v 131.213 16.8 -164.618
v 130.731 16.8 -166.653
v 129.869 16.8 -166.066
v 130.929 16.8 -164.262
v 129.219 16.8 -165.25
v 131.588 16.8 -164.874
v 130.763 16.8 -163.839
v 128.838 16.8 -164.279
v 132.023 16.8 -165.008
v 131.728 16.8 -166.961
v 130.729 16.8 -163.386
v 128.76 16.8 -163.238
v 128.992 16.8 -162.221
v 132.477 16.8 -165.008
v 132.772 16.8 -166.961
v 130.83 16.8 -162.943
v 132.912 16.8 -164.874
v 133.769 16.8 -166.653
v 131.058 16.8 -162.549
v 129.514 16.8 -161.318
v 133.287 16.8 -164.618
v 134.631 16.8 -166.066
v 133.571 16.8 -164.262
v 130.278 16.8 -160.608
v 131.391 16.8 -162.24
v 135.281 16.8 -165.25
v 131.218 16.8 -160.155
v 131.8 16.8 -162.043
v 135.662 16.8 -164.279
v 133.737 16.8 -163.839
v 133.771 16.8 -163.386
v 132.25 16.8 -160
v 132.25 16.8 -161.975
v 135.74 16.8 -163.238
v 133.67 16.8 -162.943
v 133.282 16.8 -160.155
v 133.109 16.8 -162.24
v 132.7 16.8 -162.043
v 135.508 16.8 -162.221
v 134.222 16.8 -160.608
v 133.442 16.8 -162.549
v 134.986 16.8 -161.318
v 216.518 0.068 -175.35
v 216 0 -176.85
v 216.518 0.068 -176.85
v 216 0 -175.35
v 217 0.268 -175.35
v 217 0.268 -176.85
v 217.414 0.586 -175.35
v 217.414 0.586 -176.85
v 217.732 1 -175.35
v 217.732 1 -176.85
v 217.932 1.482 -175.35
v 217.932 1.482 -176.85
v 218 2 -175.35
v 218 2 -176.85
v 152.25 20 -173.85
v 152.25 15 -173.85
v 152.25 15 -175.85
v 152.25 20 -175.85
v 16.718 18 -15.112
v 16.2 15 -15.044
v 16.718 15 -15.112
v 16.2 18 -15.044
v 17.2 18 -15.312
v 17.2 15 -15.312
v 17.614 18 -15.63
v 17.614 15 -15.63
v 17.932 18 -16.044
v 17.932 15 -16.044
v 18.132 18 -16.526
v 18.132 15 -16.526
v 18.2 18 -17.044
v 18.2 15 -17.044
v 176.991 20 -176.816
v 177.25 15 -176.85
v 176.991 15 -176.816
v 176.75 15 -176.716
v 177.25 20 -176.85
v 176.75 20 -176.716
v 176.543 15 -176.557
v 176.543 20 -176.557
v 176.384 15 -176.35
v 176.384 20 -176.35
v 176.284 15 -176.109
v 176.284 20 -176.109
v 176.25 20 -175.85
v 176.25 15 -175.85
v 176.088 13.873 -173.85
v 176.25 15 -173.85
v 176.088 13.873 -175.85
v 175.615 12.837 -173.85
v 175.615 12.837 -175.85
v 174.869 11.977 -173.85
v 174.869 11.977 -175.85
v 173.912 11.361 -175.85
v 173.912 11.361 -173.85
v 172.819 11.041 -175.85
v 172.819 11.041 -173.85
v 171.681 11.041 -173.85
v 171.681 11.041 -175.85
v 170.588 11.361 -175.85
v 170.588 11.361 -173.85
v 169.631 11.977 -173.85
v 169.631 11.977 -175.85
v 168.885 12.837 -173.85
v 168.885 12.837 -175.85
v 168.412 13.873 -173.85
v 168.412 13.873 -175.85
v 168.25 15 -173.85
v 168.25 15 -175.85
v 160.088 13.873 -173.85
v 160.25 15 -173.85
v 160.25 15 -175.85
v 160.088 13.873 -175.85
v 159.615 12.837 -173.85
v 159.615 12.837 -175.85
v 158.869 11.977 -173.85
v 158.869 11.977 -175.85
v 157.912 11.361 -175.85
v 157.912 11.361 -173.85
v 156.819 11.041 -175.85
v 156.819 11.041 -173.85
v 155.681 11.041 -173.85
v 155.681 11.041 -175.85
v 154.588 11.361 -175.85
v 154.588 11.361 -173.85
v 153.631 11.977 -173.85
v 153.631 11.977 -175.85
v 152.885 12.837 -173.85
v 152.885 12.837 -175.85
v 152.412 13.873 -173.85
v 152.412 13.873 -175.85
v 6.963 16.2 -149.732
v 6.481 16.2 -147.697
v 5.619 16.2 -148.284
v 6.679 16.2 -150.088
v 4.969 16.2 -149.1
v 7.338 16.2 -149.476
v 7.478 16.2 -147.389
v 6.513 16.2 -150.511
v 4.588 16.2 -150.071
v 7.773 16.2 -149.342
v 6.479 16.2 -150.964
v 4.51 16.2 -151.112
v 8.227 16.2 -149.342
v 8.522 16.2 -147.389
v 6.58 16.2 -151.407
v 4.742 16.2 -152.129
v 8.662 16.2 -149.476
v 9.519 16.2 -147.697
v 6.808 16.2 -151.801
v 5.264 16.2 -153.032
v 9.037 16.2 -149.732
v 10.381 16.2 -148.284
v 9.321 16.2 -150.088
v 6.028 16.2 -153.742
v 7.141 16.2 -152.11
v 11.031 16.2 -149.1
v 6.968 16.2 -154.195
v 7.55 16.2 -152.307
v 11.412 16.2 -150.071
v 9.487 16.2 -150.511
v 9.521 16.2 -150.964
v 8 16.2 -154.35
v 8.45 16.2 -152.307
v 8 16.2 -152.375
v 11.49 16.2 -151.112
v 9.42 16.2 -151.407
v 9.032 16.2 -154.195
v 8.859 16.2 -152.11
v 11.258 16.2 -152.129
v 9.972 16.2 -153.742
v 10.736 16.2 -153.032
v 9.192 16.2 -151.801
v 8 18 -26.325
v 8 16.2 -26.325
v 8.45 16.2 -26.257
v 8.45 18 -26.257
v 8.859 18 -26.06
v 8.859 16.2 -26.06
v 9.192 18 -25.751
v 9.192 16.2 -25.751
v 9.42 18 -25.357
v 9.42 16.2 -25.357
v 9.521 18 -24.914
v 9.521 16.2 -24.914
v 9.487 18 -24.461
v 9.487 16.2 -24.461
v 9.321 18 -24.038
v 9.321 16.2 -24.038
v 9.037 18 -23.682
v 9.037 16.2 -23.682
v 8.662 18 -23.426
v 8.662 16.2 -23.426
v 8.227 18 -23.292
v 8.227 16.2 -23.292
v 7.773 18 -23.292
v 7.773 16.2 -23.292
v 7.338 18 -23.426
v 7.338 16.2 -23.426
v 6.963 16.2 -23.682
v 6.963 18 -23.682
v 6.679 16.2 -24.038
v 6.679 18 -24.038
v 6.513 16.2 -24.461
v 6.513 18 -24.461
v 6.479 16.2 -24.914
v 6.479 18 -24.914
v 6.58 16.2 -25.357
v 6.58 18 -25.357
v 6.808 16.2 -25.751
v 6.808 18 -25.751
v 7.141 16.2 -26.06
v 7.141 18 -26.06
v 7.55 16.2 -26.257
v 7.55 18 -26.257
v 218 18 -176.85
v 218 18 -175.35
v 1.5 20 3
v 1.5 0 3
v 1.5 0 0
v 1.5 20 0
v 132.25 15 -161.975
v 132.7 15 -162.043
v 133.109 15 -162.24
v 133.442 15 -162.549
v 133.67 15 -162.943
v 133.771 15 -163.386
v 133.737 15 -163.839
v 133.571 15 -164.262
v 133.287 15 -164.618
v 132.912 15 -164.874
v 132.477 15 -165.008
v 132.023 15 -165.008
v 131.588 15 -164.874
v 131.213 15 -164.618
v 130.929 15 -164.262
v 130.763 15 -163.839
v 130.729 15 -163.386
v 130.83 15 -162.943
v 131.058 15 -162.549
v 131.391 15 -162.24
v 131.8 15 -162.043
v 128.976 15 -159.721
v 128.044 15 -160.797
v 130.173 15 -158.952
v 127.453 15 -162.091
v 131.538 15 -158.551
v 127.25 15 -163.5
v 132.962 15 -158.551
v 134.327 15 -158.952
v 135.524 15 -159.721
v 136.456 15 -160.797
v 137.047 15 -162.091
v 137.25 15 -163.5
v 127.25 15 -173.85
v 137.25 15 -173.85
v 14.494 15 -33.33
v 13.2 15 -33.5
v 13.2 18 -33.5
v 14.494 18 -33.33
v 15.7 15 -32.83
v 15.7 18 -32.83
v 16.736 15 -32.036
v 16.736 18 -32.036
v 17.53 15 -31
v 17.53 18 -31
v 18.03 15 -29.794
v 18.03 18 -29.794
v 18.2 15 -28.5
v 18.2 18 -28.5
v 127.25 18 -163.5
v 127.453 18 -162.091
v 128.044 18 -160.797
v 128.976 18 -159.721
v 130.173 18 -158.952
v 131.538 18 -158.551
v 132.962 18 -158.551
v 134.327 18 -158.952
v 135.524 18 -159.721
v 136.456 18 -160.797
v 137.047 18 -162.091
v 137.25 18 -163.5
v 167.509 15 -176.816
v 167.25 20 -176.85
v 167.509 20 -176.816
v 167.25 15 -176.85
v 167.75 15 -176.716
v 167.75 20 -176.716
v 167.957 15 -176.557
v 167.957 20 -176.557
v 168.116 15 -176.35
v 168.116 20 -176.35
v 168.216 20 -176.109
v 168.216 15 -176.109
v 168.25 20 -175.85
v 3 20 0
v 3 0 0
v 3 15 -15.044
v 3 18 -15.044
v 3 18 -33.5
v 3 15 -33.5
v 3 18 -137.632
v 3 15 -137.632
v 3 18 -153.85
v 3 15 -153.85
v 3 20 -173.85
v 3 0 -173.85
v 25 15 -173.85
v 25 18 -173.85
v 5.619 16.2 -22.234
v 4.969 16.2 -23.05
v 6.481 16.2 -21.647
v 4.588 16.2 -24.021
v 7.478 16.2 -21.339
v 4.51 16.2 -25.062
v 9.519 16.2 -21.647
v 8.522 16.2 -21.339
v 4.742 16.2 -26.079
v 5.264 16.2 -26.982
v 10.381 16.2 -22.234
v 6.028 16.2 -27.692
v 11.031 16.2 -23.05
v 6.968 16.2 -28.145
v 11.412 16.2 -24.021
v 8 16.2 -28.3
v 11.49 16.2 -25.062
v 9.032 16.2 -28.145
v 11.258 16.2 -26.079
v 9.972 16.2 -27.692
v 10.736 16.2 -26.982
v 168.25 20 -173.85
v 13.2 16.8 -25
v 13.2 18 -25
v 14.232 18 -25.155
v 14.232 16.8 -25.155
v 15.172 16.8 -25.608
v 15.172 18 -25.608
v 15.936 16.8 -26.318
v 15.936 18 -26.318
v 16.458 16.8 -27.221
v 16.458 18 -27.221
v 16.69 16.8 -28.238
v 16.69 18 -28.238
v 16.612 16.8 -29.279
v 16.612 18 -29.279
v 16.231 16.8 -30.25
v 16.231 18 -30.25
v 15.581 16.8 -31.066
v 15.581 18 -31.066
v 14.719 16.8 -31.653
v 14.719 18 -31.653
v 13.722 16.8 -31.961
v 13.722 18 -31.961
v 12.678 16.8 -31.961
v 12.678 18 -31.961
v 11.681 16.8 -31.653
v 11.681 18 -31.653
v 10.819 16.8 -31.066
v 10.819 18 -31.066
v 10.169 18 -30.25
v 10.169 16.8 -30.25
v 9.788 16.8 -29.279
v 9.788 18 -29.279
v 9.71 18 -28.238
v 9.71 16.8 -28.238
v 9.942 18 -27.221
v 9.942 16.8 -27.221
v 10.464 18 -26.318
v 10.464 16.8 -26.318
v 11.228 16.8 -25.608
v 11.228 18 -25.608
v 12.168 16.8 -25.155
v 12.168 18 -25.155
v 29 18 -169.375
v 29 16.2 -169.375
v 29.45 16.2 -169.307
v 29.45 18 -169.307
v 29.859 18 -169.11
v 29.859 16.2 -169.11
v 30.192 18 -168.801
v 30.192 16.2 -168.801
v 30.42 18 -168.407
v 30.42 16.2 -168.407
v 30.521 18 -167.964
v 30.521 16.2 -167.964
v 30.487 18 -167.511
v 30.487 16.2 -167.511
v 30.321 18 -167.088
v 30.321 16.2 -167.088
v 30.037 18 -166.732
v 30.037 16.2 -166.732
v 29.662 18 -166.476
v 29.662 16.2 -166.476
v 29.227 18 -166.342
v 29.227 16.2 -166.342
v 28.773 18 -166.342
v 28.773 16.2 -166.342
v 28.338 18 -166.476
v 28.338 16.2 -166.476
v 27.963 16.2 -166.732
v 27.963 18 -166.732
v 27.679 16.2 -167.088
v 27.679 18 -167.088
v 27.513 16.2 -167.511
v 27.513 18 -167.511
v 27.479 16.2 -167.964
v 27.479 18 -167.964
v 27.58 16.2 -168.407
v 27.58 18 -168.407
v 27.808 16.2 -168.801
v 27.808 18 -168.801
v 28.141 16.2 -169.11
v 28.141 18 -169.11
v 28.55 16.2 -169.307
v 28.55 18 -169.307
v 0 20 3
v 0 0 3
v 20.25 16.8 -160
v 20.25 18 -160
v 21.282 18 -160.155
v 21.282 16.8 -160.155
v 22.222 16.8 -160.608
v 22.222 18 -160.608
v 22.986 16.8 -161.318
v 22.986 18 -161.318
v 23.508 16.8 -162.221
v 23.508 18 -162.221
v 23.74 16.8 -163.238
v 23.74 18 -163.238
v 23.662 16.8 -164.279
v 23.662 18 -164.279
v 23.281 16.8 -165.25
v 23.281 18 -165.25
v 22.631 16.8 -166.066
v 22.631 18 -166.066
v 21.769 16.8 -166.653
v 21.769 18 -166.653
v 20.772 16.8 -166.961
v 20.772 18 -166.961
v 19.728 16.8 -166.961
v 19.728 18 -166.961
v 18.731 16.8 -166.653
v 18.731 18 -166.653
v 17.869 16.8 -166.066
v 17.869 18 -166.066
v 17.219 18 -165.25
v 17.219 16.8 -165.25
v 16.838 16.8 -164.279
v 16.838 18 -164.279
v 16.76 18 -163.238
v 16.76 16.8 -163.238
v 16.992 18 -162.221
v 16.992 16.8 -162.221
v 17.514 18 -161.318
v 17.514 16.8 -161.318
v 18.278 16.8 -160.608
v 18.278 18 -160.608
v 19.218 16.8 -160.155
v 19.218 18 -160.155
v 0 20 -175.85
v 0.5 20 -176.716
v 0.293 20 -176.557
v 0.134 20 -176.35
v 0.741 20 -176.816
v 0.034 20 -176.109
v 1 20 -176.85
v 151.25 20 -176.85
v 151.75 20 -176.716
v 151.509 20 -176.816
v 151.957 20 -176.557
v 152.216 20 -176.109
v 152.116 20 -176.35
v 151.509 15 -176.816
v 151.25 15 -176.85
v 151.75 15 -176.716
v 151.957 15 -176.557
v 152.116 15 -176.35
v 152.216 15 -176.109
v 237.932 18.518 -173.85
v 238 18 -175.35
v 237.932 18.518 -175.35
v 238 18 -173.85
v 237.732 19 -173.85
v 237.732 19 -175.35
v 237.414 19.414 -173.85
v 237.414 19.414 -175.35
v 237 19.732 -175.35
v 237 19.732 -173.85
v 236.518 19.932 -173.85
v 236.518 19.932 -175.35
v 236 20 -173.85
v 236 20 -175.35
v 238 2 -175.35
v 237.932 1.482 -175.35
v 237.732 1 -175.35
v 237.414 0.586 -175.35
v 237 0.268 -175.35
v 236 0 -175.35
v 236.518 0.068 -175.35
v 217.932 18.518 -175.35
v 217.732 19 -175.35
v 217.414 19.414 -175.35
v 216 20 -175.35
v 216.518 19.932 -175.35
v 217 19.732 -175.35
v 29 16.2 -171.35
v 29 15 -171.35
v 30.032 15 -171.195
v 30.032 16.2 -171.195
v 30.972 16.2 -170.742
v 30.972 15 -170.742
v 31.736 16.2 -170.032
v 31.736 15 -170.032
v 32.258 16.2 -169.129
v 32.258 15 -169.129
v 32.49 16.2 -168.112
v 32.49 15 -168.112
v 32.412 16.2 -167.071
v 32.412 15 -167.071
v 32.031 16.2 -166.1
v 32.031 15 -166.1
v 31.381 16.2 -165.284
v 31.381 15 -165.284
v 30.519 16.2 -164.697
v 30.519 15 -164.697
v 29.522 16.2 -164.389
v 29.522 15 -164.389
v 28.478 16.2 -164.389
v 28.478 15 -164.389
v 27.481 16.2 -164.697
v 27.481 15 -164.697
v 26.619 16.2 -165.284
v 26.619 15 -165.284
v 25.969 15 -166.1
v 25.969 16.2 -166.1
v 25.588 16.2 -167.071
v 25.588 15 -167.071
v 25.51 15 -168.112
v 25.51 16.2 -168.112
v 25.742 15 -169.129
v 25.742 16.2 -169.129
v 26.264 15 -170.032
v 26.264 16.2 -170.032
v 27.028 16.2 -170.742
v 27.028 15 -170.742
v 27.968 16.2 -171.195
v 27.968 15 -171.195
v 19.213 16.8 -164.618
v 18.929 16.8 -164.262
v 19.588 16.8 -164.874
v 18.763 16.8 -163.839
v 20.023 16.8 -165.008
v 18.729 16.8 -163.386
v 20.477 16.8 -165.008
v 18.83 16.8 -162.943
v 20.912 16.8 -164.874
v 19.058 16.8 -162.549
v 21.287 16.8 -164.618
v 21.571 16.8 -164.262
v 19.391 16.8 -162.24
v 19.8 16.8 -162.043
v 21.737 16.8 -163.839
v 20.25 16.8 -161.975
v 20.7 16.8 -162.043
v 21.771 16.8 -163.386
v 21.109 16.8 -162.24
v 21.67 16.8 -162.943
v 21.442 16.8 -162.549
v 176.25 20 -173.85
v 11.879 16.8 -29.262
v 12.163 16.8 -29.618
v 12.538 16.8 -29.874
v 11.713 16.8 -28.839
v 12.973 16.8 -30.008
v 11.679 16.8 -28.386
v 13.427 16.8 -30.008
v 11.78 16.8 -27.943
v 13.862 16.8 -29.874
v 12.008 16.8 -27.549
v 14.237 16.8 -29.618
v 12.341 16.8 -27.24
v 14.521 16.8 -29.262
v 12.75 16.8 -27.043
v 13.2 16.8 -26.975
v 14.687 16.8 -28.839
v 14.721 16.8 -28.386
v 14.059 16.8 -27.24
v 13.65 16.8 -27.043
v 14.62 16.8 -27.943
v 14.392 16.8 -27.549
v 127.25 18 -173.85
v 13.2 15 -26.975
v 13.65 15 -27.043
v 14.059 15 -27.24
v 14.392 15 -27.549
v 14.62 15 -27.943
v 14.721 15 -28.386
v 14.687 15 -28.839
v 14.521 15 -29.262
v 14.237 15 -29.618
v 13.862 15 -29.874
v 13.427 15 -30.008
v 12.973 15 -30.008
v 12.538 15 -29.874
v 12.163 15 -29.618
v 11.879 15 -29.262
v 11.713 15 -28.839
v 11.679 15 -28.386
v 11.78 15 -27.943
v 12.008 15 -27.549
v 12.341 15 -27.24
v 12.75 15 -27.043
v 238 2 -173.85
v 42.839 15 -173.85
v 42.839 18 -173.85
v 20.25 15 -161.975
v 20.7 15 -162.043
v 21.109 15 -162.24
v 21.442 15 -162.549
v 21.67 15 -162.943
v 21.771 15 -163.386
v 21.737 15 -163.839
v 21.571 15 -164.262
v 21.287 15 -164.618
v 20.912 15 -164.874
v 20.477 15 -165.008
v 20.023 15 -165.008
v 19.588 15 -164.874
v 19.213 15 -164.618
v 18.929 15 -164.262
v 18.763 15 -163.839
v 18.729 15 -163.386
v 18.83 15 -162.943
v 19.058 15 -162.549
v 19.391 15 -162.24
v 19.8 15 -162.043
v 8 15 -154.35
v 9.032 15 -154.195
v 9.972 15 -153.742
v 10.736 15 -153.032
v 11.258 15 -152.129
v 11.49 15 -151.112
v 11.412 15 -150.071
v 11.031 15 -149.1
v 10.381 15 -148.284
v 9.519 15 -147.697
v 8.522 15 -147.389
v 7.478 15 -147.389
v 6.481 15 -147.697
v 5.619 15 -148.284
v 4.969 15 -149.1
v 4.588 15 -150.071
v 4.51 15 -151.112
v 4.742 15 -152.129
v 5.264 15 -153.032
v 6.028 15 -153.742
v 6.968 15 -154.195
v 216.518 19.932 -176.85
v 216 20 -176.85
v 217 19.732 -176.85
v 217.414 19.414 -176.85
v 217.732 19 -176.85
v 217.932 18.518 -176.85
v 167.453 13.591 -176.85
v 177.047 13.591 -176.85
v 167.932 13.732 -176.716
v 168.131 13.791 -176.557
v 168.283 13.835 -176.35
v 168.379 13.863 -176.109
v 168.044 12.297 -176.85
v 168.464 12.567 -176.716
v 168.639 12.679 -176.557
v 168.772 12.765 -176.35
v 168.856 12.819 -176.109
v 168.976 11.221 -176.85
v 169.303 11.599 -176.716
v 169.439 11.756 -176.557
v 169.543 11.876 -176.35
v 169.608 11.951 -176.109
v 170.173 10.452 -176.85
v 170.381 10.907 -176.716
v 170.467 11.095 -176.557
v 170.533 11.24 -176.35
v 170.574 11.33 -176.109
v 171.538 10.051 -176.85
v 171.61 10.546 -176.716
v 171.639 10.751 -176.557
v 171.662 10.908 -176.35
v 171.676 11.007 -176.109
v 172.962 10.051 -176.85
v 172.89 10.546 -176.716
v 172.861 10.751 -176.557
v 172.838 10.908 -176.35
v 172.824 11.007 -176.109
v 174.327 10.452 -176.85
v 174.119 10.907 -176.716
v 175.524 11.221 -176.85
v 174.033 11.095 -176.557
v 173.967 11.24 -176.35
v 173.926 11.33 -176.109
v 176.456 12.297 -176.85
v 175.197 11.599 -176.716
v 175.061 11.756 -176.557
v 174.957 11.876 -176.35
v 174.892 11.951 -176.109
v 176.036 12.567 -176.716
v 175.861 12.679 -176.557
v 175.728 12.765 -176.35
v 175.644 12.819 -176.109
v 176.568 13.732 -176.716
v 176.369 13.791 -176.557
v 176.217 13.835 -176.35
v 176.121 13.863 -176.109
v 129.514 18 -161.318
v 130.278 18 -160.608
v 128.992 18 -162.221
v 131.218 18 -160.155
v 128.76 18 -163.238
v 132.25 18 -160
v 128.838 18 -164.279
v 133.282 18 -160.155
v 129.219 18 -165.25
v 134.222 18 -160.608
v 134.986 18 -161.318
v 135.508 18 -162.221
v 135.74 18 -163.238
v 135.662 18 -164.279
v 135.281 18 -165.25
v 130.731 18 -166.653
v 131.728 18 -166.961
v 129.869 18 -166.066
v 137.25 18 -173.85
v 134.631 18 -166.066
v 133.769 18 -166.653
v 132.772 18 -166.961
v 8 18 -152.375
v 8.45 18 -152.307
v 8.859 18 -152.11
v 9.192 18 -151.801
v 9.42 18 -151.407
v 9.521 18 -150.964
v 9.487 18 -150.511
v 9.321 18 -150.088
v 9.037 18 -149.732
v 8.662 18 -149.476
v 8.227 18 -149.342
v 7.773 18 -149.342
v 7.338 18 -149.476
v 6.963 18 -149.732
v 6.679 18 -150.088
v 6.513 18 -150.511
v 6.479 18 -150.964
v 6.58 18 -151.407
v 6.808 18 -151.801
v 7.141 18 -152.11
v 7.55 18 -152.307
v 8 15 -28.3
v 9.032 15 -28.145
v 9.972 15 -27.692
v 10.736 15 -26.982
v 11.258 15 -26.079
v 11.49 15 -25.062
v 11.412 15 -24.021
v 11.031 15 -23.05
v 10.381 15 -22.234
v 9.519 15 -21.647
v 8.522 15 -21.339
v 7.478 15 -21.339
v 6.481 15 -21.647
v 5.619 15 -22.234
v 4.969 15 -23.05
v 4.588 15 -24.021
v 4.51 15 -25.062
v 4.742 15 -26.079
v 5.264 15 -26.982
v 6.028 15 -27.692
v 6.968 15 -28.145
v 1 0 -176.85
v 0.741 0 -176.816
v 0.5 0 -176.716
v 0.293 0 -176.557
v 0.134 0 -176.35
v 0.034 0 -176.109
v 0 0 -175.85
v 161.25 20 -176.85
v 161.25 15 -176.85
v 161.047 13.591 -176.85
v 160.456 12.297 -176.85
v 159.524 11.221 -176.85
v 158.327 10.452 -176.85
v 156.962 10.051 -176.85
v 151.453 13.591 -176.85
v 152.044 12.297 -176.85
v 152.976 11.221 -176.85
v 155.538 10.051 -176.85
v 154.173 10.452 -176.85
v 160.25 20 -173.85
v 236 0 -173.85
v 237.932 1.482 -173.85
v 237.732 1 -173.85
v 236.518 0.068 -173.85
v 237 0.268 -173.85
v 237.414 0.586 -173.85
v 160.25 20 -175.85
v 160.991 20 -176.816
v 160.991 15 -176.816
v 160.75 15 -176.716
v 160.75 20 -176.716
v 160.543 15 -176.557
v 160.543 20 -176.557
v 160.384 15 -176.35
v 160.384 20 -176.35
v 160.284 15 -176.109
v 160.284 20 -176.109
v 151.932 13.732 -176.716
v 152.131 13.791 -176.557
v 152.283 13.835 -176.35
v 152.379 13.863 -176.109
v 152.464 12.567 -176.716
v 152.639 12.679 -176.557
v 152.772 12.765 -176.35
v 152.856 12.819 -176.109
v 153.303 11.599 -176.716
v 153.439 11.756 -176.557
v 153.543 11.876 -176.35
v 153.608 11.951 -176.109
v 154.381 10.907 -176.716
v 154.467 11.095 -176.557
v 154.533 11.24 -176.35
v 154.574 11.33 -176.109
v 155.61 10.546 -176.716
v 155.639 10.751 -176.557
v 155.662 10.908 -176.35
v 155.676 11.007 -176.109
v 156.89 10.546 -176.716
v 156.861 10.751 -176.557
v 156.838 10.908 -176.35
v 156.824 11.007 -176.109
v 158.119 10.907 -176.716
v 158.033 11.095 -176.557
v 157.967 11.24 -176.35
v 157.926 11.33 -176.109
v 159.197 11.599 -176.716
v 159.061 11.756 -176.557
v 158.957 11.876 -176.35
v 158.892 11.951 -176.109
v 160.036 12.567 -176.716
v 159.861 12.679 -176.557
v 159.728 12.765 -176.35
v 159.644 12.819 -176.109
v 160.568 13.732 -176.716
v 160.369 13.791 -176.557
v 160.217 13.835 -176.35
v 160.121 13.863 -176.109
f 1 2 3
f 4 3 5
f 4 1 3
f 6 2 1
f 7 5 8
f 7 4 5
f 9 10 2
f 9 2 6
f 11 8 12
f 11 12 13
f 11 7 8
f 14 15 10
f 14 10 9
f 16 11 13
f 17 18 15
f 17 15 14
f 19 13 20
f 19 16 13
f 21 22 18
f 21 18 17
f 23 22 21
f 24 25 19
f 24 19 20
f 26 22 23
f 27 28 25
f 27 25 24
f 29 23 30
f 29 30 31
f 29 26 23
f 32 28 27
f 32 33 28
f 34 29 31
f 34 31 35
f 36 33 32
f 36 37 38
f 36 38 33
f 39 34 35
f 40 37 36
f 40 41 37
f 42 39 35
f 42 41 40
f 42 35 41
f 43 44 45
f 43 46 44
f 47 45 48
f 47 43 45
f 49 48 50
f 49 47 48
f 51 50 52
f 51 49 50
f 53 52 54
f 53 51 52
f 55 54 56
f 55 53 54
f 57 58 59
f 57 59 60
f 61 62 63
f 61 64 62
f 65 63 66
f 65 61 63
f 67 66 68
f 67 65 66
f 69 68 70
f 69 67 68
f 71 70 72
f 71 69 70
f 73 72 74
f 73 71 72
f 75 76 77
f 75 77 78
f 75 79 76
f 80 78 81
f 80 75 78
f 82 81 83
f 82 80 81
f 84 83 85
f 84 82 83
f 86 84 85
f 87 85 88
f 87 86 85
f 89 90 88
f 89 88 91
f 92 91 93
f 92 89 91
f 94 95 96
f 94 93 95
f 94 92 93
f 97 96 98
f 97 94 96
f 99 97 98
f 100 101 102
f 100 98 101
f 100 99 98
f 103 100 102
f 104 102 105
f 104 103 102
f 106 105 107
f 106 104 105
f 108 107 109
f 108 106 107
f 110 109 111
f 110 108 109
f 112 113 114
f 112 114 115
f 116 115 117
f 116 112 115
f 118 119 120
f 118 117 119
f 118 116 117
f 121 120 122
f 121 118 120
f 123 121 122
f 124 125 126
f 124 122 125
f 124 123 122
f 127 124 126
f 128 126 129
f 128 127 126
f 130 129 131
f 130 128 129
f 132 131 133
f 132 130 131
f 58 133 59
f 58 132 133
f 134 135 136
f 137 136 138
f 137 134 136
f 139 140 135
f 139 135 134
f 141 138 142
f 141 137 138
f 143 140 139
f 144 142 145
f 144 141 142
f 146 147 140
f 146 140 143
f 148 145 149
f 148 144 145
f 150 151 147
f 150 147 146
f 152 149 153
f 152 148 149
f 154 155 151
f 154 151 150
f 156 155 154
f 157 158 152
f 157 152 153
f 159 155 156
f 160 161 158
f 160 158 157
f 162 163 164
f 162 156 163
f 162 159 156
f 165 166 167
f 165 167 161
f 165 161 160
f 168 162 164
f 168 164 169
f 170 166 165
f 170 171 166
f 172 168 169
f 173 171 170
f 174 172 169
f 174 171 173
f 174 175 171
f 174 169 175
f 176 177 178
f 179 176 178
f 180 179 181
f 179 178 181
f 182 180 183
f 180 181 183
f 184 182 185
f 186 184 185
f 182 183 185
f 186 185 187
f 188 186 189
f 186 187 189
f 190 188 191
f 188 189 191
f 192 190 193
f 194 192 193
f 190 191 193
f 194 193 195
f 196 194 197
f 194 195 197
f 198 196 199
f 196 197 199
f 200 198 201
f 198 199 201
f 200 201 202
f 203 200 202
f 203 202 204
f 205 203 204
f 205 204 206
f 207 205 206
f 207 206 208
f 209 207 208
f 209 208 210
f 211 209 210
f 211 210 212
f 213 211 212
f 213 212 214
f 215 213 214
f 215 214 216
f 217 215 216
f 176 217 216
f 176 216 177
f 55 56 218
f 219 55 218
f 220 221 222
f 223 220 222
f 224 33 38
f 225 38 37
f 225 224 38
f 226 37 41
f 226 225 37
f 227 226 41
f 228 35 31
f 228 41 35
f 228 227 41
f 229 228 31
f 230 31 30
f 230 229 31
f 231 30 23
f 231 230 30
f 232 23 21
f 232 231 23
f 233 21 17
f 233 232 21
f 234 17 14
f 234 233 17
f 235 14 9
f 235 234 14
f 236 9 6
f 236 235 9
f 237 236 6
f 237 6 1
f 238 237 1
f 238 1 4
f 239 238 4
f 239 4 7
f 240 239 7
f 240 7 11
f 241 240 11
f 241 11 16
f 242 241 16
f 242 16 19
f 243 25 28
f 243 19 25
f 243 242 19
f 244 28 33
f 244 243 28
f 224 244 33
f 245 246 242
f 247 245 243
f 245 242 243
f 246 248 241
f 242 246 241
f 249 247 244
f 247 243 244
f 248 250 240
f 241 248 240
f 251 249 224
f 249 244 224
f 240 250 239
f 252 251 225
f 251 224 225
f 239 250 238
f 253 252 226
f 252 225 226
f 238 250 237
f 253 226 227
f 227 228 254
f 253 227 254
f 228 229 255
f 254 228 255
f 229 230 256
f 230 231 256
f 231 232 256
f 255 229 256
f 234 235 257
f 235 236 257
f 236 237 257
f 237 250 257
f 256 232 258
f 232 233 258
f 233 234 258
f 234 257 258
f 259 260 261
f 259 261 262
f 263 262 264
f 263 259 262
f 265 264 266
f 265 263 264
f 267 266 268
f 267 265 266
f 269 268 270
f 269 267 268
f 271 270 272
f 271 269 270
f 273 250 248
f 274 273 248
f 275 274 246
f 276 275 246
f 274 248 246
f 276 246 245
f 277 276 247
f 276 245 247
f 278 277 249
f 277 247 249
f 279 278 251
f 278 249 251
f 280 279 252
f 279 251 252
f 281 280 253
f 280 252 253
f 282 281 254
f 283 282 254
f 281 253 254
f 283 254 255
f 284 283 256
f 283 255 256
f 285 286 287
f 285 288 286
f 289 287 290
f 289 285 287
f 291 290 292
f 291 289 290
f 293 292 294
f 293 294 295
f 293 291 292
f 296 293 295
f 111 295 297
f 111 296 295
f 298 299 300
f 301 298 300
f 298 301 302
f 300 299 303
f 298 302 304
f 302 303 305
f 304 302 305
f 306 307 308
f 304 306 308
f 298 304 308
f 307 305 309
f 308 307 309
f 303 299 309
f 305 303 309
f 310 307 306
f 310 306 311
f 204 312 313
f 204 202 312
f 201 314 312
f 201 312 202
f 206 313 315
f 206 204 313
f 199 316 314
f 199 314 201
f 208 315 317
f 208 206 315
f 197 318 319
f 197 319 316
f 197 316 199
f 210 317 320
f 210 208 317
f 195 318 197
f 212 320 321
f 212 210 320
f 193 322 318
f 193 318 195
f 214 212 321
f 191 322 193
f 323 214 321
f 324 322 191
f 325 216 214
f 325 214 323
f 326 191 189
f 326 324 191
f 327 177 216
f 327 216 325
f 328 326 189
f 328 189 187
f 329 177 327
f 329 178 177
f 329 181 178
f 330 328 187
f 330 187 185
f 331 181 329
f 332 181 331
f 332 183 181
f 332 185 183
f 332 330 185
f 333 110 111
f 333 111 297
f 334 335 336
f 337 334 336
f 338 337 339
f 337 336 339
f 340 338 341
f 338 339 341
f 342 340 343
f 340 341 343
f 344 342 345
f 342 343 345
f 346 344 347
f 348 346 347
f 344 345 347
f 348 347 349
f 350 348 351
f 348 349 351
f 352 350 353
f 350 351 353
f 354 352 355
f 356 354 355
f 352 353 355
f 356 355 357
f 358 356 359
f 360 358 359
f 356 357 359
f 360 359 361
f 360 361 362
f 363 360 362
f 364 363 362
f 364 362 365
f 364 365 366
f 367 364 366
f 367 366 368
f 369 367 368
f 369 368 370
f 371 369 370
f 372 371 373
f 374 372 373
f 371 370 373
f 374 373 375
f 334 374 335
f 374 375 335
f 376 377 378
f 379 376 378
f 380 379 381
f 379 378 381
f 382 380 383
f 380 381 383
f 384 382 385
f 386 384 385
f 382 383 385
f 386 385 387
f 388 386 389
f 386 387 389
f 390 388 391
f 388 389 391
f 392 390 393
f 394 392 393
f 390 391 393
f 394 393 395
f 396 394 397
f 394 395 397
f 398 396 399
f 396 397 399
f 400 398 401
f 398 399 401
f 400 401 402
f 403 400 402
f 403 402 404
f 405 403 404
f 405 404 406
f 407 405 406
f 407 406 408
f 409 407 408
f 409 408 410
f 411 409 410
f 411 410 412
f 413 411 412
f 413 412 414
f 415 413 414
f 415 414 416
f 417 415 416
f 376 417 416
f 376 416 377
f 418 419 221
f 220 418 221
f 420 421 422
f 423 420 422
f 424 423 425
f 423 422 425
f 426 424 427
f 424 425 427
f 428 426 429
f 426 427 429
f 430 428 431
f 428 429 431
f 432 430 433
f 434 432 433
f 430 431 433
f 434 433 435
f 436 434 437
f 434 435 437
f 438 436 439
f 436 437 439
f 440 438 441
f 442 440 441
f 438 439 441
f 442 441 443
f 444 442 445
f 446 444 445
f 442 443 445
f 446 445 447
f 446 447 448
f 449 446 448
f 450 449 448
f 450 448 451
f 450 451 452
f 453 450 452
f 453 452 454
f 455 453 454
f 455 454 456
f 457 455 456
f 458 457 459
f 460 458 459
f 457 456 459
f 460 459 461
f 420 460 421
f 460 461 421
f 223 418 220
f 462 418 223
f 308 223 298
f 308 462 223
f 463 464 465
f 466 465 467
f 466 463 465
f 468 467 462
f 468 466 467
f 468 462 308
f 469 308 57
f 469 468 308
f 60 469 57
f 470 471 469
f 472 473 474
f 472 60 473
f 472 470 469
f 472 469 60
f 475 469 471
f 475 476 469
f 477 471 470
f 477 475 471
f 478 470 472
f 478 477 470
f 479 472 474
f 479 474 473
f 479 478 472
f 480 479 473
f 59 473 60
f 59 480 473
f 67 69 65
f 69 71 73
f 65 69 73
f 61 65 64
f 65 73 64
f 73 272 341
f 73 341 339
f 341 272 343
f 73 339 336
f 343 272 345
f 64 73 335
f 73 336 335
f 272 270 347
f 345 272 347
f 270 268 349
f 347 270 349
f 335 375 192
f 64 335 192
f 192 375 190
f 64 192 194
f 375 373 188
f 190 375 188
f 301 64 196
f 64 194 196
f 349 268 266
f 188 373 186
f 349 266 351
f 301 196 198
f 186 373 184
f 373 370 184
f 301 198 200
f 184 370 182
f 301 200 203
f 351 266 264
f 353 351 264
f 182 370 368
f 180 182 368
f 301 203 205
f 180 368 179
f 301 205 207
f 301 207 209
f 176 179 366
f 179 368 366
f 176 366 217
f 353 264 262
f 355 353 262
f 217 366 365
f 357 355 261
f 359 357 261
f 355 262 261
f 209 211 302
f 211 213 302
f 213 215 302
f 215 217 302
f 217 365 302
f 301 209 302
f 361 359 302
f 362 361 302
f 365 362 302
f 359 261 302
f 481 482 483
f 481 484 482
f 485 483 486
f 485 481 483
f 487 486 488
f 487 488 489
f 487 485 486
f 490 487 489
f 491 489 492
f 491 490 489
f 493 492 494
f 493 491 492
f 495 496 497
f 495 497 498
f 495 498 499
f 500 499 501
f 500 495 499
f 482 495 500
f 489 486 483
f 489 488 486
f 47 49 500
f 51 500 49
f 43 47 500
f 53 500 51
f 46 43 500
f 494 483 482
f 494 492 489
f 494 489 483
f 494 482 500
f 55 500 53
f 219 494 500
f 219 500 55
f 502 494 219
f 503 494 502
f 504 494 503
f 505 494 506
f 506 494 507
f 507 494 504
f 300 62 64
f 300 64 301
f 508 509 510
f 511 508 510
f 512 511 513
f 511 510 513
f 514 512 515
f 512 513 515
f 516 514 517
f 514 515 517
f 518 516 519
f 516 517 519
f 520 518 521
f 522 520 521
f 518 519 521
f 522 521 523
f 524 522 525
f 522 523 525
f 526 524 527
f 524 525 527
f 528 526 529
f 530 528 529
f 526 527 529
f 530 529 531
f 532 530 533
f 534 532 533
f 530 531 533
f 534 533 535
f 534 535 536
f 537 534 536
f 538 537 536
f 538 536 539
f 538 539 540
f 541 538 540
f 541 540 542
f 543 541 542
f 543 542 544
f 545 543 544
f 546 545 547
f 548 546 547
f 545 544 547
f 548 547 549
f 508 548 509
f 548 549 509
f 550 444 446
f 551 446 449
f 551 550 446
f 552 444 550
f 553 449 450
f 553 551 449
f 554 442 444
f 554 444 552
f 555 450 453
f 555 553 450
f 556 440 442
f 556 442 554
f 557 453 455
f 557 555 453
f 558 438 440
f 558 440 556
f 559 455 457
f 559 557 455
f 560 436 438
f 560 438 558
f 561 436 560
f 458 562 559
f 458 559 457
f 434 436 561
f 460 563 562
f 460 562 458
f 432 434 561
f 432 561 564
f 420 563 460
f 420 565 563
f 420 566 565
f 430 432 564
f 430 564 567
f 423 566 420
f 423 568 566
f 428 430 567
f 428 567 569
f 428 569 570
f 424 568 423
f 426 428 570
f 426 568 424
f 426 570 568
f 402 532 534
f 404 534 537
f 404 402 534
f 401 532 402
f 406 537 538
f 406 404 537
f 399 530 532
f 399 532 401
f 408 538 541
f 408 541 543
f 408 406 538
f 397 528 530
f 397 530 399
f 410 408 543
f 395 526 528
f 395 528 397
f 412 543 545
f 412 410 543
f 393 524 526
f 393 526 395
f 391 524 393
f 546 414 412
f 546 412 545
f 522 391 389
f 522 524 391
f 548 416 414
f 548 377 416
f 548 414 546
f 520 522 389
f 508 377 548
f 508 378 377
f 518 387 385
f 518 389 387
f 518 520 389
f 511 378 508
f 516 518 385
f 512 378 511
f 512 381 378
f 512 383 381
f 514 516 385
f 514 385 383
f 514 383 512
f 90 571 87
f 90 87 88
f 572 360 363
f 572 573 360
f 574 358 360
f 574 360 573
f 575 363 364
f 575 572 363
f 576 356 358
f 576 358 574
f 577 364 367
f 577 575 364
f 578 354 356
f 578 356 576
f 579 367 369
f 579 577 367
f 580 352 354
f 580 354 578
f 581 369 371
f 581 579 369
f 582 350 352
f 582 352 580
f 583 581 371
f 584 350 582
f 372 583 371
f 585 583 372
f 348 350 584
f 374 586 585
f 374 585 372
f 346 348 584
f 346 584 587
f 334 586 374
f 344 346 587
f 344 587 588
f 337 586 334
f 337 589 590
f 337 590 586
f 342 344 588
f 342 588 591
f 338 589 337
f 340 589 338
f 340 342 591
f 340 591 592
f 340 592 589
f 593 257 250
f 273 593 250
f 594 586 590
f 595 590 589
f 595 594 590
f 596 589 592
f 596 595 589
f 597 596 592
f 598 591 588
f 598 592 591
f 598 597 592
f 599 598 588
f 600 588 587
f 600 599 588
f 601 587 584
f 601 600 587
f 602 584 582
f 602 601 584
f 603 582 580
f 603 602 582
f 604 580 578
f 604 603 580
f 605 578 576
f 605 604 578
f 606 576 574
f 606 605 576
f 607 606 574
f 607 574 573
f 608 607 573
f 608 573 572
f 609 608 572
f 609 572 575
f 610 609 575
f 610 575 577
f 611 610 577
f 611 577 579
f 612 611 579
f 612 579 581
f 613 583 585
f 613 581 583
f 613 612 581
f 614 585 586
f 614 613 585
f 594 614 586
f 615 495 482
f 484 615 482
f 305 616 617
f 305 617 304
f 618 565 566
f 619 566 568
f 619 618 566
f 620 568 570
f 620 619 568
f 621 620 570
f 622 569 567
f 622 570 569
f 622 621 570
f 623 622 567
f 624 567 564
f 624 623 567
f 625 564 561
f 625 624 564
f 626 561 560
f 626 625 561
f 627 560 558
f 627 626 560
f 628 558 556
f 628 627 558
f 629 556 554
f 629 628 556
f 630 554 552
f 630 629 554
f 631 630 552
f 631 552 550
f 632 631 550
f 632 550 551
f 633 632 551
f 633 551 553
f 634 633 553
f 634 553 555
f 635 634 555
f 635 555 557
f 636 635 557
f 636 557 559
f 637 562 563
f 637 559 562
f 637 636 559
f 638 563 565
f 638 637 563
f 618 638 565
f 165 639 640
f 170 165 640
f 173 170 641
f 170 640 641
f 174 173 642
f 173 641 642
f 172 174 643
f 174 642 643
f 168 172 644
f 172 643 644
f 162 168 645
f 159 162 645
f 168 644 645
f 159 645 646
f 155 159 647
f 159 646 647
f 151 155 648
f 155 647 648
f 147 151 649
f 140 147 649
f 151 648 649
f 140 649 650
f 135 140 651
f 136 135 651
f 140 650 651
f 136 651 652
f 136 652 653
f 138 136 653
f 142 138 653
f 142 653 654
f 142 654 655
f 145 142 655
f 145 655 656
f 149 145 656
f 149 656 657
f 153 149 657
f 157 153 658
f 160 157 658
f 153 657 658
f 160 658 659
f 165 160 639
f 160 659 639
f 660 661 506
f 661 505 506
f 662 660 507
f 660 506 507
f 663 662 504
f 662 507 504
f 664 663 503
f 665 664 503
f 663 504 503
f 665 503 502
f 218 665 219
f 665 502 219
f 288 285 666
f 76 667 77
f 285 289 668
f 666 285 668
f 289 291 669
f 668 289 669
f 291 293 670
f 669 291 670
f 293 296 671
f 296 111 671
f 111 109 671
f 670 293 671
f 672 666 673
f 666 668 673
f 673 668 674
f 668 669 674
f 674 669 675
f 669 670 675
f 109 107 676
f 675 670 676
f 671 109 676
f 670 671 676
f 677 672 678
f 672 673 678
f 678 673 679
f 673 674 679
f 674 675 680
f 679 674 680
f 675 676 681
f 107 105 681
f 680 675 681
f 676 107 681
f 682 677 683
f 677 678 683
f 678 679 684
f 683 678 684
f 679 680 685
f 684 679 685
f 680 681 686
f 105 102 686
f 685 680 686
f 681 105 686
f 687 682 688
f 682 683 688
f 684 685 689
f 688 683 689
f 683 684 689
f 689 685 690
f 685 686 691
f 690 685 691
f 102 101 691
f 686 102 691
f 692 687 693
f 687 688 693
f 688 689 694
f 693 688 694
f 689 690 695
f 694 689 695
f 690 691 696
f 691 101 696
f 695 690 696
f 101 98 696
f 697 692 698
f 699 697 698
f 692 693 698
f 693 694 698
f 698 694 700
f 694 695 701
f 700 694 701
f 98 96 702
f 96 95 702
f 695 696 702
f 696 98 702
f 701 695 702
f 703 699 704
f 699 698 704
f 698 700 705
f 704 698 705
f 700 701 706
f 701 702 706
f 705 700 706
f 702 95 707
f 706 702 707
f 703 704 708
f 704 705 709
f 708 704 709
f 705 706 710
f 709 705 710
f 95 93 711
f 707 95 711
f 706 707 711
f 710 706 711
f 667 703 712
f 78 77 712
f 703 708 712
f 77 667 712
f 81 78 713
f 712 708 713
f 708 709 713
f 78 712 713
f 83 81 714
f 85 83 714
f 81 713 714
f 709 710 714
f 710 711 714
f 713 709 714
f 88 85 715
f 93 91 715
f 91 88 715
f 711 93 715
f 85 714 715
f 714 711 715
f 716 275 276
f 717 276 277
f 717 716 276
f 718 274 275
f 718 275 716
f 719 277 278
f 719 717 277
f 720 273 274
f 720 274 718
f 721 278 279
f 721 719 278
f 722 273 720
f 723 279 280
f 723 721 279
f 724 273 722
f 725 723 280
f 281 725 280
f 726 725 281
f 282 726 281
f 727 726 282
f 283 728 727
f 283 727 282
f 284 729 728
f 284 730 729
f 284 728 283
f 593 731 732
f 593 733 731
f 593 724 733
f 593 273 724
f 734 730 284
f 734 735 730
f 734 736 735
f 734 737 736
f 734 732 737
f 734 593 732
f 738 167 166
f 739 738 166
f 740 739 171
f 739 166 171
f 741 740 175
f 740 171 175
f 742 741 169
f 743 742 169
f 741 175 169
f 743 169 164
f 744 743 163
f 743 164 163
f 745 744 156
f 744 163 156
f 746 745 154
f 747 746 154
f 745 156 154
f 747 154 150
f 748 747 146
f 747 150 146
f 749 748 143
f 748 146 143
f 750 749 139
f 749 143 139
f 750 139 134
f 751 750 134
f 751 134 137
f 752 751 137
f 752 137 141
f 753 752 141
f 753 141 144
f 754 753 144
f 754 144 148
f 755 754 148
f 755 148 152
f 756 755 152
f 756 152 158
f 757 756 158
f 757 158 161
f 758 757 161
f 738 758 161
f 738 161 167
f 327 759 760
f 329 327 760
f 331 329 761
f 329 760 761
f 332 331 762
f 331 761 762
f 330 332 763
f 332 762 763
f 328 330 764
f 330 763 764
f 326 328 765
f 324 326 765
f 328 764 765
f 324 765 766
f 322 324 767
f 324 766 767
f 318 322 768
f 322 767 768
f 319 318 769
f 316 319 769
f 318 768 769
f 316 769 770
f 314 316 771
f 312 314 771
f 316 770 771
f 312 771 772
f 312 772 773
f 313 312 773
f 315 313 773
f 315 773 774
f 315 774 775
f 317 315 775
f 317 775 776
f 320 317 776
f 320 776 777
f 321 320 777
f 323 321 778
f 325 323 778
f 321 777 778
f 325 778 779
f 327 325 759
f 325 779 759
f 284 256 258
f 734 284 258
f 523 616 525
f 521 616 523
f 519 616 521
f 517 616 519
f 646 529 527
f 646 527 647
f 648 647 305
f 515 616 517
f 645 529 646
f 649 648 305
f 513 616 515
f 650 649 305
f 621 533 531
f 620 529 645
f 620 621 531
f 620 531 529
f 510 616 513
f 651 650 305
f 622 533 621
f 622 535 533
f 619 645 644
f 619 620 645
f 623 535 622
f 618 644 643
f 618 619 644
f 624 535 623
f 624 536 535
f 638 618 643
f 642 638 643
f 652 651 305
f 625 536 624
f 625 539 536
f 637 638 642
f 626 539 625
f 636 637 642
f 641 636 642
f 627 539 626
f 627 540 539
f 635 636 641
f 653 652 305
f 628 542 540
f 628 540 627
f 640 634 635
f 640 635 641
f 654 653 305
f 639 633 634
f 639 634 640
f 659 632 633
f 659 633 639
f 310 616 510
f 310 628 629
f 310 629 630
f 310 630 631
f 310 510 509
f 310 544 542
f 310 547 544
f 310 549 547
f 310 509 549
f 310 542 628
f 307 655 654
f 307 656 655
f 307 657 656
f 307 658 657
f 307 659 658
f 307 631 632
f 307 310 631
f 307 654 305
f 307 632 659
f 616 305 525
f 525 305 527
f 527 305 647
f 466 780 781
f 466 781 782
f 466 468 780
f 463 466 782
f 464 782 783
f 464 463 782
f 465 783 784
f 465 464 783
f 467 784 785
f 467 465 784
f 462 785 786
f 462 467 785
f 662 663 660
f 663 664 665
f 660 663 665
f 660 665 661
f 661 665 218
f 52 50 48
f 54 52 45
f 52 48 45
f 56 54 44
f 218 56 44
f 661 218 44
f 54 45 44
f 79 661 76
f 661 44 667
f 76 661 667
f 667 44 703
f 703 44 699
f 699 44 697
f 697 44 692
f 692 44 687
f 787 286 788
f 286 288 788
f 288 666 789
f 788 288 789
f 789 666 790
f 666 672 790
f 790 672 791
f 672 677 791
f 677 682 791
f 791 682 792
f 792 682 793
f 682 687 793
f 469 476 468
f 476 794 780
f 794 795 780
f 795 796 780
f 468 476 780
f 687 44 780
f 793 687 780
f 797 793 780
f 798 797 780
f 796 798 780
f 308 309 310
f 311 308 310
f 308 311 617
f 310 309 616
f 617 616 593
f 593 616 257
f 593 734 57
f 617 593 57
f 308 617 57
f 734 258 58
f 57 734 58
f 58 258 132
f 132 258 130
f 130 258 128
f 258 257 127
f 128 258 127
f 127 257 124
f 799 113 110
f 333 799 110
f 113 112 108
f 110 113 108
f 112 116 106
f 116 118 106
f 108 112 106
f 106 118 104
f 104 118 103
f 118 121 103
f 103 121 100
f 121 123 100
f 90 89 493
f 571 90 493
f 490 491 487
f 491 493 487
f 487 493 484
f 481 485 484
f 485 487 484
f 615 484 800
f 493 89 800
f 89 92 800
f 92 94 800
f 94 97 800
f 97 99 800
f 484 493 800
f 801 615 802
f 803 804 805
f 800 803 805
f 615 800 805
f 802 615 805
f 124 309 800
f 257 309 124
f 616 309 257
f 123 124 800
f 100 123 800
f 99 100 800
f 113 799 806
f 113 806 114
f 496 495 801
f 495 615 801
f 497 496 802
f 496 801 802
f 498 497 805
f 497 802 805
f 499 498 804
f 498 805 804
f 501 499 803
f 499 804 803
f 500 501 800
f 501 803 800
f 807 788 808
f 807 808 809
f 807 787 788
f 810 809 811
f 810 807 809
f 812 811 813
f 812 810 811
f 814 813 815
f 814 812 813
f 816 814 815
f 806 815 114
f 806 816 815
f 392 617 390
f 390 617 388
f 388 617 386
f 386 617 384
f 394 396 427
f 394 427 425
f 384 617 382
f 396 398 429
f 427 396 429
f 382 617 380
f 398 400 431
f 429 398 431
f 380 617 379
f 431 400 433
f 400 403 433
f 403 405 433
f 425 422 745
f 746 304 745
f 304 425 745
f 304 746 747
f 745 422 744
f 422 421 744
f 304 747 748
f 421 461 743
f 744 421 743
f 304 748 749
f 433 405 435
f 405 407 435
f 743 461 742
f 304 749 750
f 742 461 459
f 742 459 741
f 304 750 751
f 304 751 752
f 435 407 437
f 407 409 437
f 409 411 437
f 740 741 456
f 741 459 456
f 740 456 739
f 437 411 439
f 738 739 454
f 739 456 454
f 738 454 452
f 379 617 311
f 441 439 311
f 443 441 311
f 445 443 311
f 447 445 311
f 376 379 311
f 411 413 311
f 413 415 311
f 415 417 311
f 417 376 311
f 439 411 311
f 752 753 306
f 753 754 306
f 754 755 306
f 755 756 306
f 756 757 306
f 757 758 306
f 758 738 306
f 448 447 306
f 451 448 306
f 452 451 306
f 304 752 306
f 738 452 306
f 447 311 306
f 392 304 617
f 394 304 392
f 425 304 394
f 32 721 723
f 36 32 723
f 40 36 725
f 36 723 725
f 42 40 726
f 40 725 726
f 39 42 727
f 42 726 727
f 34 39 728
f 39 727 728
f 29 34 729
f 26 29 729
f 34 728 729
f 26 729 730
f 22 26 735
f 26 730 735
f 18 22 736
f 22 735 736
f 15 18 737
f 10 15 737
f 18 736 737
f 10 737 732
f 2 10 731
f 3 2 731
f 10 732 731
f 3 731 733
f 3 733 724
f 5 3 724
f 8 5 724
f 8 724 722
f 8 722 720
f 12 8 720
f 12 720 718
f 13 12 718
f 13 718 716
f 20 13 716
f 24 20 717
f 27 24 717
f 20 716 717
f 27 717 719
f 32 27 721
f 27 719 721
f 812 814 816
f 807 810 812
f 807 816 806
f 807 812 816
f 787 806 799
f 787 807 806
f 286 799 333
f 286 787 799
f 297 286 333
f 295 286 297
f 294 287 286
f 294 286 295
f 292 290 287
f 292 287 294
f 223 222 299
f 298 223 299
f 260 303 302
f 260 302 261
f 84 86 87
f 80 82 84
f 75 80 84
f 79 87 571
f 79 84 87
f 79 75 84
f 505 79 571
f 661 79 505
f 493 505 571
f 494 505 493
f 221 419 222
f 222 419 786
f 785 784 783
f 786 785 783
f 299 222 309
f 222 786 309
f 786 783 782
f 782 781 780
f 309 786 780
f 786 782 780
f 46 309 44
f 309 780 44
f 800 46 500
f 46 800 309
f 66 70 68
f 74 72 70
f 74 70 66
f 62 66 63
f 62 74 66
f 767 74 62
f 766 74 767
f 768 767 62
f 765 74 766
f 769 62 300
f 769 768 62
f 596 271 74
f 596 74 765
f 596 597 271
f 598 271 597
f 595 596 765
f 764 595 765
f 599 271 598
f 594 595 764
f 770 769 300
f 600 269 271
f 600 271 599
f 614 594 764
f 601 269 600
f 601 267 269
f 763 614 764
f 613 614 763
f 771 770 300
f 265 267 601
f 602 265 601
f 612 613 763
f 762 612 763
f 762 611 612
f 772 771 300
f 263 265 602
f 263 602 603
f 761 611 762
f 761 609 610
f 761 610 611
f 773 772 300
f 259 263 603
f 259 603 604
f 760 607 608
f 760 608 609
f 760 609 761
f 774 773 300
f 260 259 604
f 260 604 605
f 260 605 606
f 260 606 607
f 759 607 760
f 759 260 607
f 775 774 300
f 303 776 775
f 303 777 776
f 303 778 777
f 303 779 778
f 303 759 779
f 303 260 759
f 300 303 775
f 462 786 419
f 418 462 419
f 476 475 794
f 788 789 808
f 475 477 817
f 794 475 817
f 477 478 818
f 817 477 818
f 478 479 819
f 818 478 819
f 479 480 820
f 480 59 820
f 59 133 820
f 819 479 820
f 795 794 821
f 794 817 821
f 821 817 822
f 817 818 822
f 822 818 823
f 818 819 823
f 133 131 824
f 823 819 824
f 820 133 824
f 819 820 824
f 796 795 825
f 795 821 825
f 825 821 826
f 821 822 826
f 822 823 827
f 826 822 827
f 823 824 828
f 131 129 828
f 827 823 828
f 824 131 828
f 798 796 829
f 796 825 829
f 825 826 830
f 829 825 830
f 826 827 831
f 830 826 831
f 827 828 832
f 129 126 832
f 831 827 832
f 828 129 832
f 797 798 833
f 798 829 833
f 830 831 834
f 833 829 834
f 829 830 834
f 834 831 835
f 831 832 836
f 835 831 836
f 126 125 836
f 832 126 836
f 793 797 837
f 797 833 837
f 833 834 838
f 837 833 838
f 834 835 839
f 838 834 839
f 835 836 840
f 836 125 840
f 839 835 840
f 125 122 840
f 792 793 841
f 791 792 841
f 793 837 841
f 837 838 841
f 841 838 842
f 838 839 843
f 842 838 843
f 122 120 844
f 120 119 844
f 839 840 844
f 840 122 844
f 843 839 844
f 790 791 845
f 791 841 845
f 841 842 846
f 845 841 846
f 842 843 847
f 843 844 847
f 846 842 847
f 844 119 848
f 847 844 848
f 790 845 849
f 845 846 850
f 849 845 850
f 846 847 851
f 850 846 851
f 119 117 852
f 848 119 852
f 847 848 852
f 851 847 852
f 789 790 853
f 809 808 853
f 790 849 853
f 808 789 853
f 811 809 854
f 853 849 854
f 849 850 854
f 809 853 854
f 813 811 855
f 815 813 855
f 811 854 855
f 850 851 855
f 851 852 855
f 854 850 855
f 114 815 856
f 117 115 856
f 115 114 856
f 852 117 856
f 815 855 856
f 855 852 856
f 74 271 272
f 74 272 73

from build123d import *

# Parameters (mm, degrees)
EXTRUDE_1_DEPTH     = 20
EXTRUDE_START       = 1
SKETCH_2_R          = 1.525
EXTRUDE_2_DEPTH     = 3
CUT_EXTRUDE_1_REACH = 358.708
SKETCH_3_W          = 31
SKETCH_3_H          = 9.5
SKETCH_4_R          = 3.5
CUT_EXTRUDE_2_DEPTH = 1.2
CUT_EXTRUDE_3_REACH = 356.959
SKETCH_5_R          = 1.525
FILLET_1_R          = 1
FILLET_3_R          = 1
SKETCH_6_R          = 3.5
CUT_EXTRUDE_4_DEPTH = 1.2
SKETCH_7_W          = 69.4
SKETCH_7_H          = 20
CUT_EXTRUDE_5_DEPTH = 3
SKETCH_8_W          = 20
SKETCH_8_H          = 20
CUT_EXTRUDE_6_DEPTH = 1.5
FILLET_4_R          = 2
FILLET_5_R          = 2
FILLET_6_R          = 2
CUT_EXTRUDE_7_DEPTH = 10
FILLET_7_R          = 1
FILLET_8_R          = 1


with BuildPart() as part:
    # 草图1 → 凸台-拉伸1 (new body)
    with BuildSketch(Plane(origin=(0, 0, 0), x_dir=(1, 0, 0), z_dir=(0, 1, 0))):
        Polygon((1.5, 0), (3, 0), (3, 173.85), (307.4, 173.85), (307.4, 176.85), (0, 176.85), (0, 0), (0, -3), (1.5, -3), align=None)
    extrude(amount=EXTRUDE_1_DEPTH)

    # 草图2 → 凸台-拉伸2 (add)
    # profile 1 of 3: a face of its own
    with BuildSketch(Plane(origin=(0, 14, 0), x_dir=(1, 0, 0), z_dir=(0, 1, 0)).offset(EXTRUDE_START)):
        Polygon((3, 153.85), (25, 173.85), (42.839282497, 173.85), (3, 137.632470457), align=None)
        with Locations(Location((20.25, 163.5, 0), (0, 0, 270))):
            Circle(SKETCH_2_R, mode=Mode.SUBTRACT)
    # profile 2 of 3: a face of its own
    with BuildSketch(Plane(origin=(0, 14, 0), x_dir=(1, 0, 0), z_dir=(0, 1, 0)).offset(EXTRUDE_START)):
        with BuildLine():
            Line((137.25, 163.5), (137.25, 173.85))
            Line((137.25, 173.85), (127.25, 173.85))
            Line((127.25, 173.85), (127.25, 163.5))
            ThreePointArc((127.25, 163.5), (132.25, 158.5), (137.25, 163.5))
        make_face()
        with Locations(Location((132.25, 163.5, 0), (0, 0, 270))):
            Circle(SKETCH_2_R, mode=Mode.SUBTRACT)
    # profile 3 of 3: a face of its own
    with BuildSketch(Plane(origin=(0, 14, 0), x_dir=(1, 0, 0), z_dir=(0, 1, 0)).offset(EXTRUDE_START)):
        with BuildLine():
            Line((3, 23.870342351), (3, 33.5))
            Line((3, 33.5), (13.2, 33.5))
            ThreePointArc((13.2, 33.5), (16.735533906, 32.035533906), (18.2, 28.5))
            Line((18.2, 28.5), (18.2, 15.043961292))
            Line((18.2, 15.043961292), (3, 15.043961292))
            Line((3, 15.043961292), (3, 23.870342351))
        make_face()
        with Locations(Location((13.2, 28.5, 0), (0, 0, 270))):
            Circle(SKETCH_2_R, mode=Mode.SUBTRACT)
    extrude(amount=EXTRUDE_2_DEPTH)

    # 草图3 → 切除-拉伸1 (cut, up to next)
    with BuildSketch(Plane(origin=(0, 0, -176.85), x_dir=(-1, 0, 0), z_dir=(0, 0, -1)), mode=Mode.PRIVATE) as cut_extrude_1_sk1:
        with Locations((-291.9, 15.25)):
            Rectangle(SKETCH_3_W, SKETCH_3_H)
    cut_extrude_1_tool1 = extrude(cut_extrude_1_sk1.sketch, amount=-CUT_EXTRUDE_1_REACH, mode=Mode.PRIVATE) & part.part
    add(cut_extrude_1_tool1.solids().sort_by_distance((291.9, 15.25, -176.85))[0], mode=Mode.SUBTRACT)

    # 草图4 → 切除-拉伸2 (cut)
    with BuildSketch(Plane(origin=(0, 18, 0), x_dir=(1, 0, 0), z_dir=(0, 1, 0))):
        with Locations(Location((13.2, 28.5, 0), (0, 0, 270))):
            Circle(SKETCH_4_R)
        with Locations(Location((20.25, 163.5, 0), (0, 0, 270))):
            Circle(SKETCH_4_R)
        with Locations(Location((132.25, 163.5, 0), (0, 0, 270))):
            Circle(SKETCH_4_R)
    extrude(amount=-CUT_EXTRUDE_2_DEPTH, mode=Mode.SUBTRACT)

    # 草图5 → 切除-拉伸3 (cut, up to next)
    with BuildSketch(Plane.XZ.offset(-15), mode=Mode.PRIVATE) as cut_extrude_3_sk1:
        with Locations(Location((29, -167.85, 0), (0, 0, 270))):
            Circle(SKETCH_5_R)
    cut_extrude_3_tool1 = extrude(cut_extrude_3_sk1.sketch, amount=-CUT_EXTRUDE_3_REACH, mode=Mode.PRIVATE) & part.part
    # 草图5 → 切除-拉伸3 (cut, up to next)
    with BuildSketch(Plane.XZ.offset(-15), mode=Mode.PRIVATE) as cut_extrude_3_sk2:
        with Locations(Location((8, -150.85, 0), (0, 0, 270))):
            Circle(SKETCH_5_R)
    cut_extrude_3_tool2 = extrude(cut_extrude_3_sk2.sketch, amount=-CUT_EXTRUDE_3_REACH, mode=Mode.PRIVATE) & part.part
    # 草图5 → 切除-拉伸3 (cut, up to next)
    with BuildSketch(Plane.XZ.offset(-15), mode=Mode.PRIVATE) as cut_extrude_3_sk3:
        with Locations(Location((8, -24.8, 0), (0, 0, 270))):
            Circle(SKETCH_5_R)
    cut_extrude_3_tool3 = extrude(cut_extrude_3_sk3.sketch, amount=-CUT_EXTRUDE_3_REACH, mode=Mode.PRIVATE) & part.part
    add(cut_extrude_3_tool1.solids().sort_by_distance((29, 15, -167.85))[0], mode=Mode.SUBTRACT)
    add(cut_extrude_3_tool2.solids().sort_by_distance((8, 15, -150.85))[0], mode=Mode.SUBTRACT)
    add(cut_extrude_3_tool3.solids().sort_by_distance((8, 15, -24.8))[0], mode=Mode.SUBTRACT)

    # 圆角1
    fillet_1_edges = [part.edges().sort_by_distance(p)[0] for p in [
        (0, 10, -176.85),
    ]]
    fillet(fillet_1_edges, radius=FILLET_1_R)

    # 圆角3
    fillet_3_edges = [part.edges().sort_by_distance(p)[0] for p in [
        (276.4, 10.5, -175.35),
    ]]
    fillet(fillet_3_edges, radius=FILLET_3_R)

    # 草图6 → 切除-拉伸4 (cut)
    with BuildSketch(Plane.XZ.offset(-15)):
        with Locations(Location((8, -24.8, 0), (0, 0, 270))):
            Circle(SKETCH_6_R)
        with Locations(Location((8, -150.85, 0), (0, 0, 270))):
            Circle(SKETCH_6_R)
        with Locations(Location((29, -167.85, 0), (0, 0, 270))):
            Circle(SKETCH_6_R)
    extrude(amount=-CUT_EXTRUDE_4_DEPTH, mode=Mode.SUBTRACT)

    # 草图7 → 切除-拉伸5 (cut)
    with BuildSketch(Plane(origin=(0, 0, -176.85), x_dir=(-1, 0, 0), z_dir=(0, 0, -1))):
        with Locations((-272.7, 10)):
            Rectangle(SKETCH_7_W, SKETCH_7_H)
    extrude(amount=-CUT_EXTRUDE_5_DEPTH, mode=Mode.SUBTRACT)

    # 草图8 → 切除-拉伸6 (cut)
    with BuildSketch(Plane(origin=(0, 0, -176.85), x_dir=(-1, 0, 0), z_dir=(0, 0, -1))):
        with Locations((-228, 10)):
            Rectangle(SKETCH_8_W, SKETCH_8_H)
    extrude(amount=-CUT_EXTRUDE_6_DEPTH, mode=Mode.SUBTRACT)

    # 圆角4
    fillet_4_edges = [part.edges().sort_by_distance(p)[0] for p in [
        (218, 20, -176.1),
        (218, 0, -176.1),
    ]]
    fillet(fillet_4_edges, radius=FILLET_4_R)

    # 圆角5
    fillet_5_edges = [part.edges().sort_by_distance(p)[0] for p in [
        (238, 20, -174.6),
        (238, 0, -174.6),
    ]]
    fillet(fillet_5_edges, radius=FILLET_5_R)

    # 圆角6
    fillet_6_edges = [part.edges().sort_by_distance(p)[0] for p in [
        (18.2, 16.5, -15.043961292),
    ]]
    fillet(fillet_6_edges, radius=FILLET_6_R)

    # 草图9 → 切除-拉伸7 (cut)
    with BuildSketch(Plane.XY.offset(-173.85)):
        with BuildLine():
            Line((152.25, 15), (152.25, 20))
            Line((152.25, 20), (160.25, 20))
            Line((160.25, 20), (160.25, 15))
            ThreePointArc((160.25, 15), (156.25, 11), (152.25, 15))
        make_face()
        with BuildLine():
            Line((168.25, 15), (168.25, 20))
            Line((168.25, 20), (176.25, 20))
            Line((176.25, 20), (176.25, 15))
            ThreePointArc((176.25, 15), (172.25, 11), (168.25, 15))
        make_face()
    extrude(amount=-CUT_EXTRUDE_7_DEPTH, mode=Mode.SUBTRACT)

    # 圆角7
    fillet_7_edges = [part.edges().sort_by_distance(p)[0] for p in [
        (156.25, 11, -176.85),
        (152.25, 17.5, -176.85),
        (160.25, 17.5, -176.85),
    ]]
    fillet(fillet_7_edges, radius=FILLET_7_R)

    # 圆角8
    fillet_8_edges = [part.edges().sort_by_distance(p)[0] for p in [
        (172.25, 11, -176.85),
        (168.25, 17.5, -176.85),
        (176.25, 17.5, -176.85),
    ]]
    fillet(fillet_8_edges, radius=FILLET_8_R)


solid = part.part
